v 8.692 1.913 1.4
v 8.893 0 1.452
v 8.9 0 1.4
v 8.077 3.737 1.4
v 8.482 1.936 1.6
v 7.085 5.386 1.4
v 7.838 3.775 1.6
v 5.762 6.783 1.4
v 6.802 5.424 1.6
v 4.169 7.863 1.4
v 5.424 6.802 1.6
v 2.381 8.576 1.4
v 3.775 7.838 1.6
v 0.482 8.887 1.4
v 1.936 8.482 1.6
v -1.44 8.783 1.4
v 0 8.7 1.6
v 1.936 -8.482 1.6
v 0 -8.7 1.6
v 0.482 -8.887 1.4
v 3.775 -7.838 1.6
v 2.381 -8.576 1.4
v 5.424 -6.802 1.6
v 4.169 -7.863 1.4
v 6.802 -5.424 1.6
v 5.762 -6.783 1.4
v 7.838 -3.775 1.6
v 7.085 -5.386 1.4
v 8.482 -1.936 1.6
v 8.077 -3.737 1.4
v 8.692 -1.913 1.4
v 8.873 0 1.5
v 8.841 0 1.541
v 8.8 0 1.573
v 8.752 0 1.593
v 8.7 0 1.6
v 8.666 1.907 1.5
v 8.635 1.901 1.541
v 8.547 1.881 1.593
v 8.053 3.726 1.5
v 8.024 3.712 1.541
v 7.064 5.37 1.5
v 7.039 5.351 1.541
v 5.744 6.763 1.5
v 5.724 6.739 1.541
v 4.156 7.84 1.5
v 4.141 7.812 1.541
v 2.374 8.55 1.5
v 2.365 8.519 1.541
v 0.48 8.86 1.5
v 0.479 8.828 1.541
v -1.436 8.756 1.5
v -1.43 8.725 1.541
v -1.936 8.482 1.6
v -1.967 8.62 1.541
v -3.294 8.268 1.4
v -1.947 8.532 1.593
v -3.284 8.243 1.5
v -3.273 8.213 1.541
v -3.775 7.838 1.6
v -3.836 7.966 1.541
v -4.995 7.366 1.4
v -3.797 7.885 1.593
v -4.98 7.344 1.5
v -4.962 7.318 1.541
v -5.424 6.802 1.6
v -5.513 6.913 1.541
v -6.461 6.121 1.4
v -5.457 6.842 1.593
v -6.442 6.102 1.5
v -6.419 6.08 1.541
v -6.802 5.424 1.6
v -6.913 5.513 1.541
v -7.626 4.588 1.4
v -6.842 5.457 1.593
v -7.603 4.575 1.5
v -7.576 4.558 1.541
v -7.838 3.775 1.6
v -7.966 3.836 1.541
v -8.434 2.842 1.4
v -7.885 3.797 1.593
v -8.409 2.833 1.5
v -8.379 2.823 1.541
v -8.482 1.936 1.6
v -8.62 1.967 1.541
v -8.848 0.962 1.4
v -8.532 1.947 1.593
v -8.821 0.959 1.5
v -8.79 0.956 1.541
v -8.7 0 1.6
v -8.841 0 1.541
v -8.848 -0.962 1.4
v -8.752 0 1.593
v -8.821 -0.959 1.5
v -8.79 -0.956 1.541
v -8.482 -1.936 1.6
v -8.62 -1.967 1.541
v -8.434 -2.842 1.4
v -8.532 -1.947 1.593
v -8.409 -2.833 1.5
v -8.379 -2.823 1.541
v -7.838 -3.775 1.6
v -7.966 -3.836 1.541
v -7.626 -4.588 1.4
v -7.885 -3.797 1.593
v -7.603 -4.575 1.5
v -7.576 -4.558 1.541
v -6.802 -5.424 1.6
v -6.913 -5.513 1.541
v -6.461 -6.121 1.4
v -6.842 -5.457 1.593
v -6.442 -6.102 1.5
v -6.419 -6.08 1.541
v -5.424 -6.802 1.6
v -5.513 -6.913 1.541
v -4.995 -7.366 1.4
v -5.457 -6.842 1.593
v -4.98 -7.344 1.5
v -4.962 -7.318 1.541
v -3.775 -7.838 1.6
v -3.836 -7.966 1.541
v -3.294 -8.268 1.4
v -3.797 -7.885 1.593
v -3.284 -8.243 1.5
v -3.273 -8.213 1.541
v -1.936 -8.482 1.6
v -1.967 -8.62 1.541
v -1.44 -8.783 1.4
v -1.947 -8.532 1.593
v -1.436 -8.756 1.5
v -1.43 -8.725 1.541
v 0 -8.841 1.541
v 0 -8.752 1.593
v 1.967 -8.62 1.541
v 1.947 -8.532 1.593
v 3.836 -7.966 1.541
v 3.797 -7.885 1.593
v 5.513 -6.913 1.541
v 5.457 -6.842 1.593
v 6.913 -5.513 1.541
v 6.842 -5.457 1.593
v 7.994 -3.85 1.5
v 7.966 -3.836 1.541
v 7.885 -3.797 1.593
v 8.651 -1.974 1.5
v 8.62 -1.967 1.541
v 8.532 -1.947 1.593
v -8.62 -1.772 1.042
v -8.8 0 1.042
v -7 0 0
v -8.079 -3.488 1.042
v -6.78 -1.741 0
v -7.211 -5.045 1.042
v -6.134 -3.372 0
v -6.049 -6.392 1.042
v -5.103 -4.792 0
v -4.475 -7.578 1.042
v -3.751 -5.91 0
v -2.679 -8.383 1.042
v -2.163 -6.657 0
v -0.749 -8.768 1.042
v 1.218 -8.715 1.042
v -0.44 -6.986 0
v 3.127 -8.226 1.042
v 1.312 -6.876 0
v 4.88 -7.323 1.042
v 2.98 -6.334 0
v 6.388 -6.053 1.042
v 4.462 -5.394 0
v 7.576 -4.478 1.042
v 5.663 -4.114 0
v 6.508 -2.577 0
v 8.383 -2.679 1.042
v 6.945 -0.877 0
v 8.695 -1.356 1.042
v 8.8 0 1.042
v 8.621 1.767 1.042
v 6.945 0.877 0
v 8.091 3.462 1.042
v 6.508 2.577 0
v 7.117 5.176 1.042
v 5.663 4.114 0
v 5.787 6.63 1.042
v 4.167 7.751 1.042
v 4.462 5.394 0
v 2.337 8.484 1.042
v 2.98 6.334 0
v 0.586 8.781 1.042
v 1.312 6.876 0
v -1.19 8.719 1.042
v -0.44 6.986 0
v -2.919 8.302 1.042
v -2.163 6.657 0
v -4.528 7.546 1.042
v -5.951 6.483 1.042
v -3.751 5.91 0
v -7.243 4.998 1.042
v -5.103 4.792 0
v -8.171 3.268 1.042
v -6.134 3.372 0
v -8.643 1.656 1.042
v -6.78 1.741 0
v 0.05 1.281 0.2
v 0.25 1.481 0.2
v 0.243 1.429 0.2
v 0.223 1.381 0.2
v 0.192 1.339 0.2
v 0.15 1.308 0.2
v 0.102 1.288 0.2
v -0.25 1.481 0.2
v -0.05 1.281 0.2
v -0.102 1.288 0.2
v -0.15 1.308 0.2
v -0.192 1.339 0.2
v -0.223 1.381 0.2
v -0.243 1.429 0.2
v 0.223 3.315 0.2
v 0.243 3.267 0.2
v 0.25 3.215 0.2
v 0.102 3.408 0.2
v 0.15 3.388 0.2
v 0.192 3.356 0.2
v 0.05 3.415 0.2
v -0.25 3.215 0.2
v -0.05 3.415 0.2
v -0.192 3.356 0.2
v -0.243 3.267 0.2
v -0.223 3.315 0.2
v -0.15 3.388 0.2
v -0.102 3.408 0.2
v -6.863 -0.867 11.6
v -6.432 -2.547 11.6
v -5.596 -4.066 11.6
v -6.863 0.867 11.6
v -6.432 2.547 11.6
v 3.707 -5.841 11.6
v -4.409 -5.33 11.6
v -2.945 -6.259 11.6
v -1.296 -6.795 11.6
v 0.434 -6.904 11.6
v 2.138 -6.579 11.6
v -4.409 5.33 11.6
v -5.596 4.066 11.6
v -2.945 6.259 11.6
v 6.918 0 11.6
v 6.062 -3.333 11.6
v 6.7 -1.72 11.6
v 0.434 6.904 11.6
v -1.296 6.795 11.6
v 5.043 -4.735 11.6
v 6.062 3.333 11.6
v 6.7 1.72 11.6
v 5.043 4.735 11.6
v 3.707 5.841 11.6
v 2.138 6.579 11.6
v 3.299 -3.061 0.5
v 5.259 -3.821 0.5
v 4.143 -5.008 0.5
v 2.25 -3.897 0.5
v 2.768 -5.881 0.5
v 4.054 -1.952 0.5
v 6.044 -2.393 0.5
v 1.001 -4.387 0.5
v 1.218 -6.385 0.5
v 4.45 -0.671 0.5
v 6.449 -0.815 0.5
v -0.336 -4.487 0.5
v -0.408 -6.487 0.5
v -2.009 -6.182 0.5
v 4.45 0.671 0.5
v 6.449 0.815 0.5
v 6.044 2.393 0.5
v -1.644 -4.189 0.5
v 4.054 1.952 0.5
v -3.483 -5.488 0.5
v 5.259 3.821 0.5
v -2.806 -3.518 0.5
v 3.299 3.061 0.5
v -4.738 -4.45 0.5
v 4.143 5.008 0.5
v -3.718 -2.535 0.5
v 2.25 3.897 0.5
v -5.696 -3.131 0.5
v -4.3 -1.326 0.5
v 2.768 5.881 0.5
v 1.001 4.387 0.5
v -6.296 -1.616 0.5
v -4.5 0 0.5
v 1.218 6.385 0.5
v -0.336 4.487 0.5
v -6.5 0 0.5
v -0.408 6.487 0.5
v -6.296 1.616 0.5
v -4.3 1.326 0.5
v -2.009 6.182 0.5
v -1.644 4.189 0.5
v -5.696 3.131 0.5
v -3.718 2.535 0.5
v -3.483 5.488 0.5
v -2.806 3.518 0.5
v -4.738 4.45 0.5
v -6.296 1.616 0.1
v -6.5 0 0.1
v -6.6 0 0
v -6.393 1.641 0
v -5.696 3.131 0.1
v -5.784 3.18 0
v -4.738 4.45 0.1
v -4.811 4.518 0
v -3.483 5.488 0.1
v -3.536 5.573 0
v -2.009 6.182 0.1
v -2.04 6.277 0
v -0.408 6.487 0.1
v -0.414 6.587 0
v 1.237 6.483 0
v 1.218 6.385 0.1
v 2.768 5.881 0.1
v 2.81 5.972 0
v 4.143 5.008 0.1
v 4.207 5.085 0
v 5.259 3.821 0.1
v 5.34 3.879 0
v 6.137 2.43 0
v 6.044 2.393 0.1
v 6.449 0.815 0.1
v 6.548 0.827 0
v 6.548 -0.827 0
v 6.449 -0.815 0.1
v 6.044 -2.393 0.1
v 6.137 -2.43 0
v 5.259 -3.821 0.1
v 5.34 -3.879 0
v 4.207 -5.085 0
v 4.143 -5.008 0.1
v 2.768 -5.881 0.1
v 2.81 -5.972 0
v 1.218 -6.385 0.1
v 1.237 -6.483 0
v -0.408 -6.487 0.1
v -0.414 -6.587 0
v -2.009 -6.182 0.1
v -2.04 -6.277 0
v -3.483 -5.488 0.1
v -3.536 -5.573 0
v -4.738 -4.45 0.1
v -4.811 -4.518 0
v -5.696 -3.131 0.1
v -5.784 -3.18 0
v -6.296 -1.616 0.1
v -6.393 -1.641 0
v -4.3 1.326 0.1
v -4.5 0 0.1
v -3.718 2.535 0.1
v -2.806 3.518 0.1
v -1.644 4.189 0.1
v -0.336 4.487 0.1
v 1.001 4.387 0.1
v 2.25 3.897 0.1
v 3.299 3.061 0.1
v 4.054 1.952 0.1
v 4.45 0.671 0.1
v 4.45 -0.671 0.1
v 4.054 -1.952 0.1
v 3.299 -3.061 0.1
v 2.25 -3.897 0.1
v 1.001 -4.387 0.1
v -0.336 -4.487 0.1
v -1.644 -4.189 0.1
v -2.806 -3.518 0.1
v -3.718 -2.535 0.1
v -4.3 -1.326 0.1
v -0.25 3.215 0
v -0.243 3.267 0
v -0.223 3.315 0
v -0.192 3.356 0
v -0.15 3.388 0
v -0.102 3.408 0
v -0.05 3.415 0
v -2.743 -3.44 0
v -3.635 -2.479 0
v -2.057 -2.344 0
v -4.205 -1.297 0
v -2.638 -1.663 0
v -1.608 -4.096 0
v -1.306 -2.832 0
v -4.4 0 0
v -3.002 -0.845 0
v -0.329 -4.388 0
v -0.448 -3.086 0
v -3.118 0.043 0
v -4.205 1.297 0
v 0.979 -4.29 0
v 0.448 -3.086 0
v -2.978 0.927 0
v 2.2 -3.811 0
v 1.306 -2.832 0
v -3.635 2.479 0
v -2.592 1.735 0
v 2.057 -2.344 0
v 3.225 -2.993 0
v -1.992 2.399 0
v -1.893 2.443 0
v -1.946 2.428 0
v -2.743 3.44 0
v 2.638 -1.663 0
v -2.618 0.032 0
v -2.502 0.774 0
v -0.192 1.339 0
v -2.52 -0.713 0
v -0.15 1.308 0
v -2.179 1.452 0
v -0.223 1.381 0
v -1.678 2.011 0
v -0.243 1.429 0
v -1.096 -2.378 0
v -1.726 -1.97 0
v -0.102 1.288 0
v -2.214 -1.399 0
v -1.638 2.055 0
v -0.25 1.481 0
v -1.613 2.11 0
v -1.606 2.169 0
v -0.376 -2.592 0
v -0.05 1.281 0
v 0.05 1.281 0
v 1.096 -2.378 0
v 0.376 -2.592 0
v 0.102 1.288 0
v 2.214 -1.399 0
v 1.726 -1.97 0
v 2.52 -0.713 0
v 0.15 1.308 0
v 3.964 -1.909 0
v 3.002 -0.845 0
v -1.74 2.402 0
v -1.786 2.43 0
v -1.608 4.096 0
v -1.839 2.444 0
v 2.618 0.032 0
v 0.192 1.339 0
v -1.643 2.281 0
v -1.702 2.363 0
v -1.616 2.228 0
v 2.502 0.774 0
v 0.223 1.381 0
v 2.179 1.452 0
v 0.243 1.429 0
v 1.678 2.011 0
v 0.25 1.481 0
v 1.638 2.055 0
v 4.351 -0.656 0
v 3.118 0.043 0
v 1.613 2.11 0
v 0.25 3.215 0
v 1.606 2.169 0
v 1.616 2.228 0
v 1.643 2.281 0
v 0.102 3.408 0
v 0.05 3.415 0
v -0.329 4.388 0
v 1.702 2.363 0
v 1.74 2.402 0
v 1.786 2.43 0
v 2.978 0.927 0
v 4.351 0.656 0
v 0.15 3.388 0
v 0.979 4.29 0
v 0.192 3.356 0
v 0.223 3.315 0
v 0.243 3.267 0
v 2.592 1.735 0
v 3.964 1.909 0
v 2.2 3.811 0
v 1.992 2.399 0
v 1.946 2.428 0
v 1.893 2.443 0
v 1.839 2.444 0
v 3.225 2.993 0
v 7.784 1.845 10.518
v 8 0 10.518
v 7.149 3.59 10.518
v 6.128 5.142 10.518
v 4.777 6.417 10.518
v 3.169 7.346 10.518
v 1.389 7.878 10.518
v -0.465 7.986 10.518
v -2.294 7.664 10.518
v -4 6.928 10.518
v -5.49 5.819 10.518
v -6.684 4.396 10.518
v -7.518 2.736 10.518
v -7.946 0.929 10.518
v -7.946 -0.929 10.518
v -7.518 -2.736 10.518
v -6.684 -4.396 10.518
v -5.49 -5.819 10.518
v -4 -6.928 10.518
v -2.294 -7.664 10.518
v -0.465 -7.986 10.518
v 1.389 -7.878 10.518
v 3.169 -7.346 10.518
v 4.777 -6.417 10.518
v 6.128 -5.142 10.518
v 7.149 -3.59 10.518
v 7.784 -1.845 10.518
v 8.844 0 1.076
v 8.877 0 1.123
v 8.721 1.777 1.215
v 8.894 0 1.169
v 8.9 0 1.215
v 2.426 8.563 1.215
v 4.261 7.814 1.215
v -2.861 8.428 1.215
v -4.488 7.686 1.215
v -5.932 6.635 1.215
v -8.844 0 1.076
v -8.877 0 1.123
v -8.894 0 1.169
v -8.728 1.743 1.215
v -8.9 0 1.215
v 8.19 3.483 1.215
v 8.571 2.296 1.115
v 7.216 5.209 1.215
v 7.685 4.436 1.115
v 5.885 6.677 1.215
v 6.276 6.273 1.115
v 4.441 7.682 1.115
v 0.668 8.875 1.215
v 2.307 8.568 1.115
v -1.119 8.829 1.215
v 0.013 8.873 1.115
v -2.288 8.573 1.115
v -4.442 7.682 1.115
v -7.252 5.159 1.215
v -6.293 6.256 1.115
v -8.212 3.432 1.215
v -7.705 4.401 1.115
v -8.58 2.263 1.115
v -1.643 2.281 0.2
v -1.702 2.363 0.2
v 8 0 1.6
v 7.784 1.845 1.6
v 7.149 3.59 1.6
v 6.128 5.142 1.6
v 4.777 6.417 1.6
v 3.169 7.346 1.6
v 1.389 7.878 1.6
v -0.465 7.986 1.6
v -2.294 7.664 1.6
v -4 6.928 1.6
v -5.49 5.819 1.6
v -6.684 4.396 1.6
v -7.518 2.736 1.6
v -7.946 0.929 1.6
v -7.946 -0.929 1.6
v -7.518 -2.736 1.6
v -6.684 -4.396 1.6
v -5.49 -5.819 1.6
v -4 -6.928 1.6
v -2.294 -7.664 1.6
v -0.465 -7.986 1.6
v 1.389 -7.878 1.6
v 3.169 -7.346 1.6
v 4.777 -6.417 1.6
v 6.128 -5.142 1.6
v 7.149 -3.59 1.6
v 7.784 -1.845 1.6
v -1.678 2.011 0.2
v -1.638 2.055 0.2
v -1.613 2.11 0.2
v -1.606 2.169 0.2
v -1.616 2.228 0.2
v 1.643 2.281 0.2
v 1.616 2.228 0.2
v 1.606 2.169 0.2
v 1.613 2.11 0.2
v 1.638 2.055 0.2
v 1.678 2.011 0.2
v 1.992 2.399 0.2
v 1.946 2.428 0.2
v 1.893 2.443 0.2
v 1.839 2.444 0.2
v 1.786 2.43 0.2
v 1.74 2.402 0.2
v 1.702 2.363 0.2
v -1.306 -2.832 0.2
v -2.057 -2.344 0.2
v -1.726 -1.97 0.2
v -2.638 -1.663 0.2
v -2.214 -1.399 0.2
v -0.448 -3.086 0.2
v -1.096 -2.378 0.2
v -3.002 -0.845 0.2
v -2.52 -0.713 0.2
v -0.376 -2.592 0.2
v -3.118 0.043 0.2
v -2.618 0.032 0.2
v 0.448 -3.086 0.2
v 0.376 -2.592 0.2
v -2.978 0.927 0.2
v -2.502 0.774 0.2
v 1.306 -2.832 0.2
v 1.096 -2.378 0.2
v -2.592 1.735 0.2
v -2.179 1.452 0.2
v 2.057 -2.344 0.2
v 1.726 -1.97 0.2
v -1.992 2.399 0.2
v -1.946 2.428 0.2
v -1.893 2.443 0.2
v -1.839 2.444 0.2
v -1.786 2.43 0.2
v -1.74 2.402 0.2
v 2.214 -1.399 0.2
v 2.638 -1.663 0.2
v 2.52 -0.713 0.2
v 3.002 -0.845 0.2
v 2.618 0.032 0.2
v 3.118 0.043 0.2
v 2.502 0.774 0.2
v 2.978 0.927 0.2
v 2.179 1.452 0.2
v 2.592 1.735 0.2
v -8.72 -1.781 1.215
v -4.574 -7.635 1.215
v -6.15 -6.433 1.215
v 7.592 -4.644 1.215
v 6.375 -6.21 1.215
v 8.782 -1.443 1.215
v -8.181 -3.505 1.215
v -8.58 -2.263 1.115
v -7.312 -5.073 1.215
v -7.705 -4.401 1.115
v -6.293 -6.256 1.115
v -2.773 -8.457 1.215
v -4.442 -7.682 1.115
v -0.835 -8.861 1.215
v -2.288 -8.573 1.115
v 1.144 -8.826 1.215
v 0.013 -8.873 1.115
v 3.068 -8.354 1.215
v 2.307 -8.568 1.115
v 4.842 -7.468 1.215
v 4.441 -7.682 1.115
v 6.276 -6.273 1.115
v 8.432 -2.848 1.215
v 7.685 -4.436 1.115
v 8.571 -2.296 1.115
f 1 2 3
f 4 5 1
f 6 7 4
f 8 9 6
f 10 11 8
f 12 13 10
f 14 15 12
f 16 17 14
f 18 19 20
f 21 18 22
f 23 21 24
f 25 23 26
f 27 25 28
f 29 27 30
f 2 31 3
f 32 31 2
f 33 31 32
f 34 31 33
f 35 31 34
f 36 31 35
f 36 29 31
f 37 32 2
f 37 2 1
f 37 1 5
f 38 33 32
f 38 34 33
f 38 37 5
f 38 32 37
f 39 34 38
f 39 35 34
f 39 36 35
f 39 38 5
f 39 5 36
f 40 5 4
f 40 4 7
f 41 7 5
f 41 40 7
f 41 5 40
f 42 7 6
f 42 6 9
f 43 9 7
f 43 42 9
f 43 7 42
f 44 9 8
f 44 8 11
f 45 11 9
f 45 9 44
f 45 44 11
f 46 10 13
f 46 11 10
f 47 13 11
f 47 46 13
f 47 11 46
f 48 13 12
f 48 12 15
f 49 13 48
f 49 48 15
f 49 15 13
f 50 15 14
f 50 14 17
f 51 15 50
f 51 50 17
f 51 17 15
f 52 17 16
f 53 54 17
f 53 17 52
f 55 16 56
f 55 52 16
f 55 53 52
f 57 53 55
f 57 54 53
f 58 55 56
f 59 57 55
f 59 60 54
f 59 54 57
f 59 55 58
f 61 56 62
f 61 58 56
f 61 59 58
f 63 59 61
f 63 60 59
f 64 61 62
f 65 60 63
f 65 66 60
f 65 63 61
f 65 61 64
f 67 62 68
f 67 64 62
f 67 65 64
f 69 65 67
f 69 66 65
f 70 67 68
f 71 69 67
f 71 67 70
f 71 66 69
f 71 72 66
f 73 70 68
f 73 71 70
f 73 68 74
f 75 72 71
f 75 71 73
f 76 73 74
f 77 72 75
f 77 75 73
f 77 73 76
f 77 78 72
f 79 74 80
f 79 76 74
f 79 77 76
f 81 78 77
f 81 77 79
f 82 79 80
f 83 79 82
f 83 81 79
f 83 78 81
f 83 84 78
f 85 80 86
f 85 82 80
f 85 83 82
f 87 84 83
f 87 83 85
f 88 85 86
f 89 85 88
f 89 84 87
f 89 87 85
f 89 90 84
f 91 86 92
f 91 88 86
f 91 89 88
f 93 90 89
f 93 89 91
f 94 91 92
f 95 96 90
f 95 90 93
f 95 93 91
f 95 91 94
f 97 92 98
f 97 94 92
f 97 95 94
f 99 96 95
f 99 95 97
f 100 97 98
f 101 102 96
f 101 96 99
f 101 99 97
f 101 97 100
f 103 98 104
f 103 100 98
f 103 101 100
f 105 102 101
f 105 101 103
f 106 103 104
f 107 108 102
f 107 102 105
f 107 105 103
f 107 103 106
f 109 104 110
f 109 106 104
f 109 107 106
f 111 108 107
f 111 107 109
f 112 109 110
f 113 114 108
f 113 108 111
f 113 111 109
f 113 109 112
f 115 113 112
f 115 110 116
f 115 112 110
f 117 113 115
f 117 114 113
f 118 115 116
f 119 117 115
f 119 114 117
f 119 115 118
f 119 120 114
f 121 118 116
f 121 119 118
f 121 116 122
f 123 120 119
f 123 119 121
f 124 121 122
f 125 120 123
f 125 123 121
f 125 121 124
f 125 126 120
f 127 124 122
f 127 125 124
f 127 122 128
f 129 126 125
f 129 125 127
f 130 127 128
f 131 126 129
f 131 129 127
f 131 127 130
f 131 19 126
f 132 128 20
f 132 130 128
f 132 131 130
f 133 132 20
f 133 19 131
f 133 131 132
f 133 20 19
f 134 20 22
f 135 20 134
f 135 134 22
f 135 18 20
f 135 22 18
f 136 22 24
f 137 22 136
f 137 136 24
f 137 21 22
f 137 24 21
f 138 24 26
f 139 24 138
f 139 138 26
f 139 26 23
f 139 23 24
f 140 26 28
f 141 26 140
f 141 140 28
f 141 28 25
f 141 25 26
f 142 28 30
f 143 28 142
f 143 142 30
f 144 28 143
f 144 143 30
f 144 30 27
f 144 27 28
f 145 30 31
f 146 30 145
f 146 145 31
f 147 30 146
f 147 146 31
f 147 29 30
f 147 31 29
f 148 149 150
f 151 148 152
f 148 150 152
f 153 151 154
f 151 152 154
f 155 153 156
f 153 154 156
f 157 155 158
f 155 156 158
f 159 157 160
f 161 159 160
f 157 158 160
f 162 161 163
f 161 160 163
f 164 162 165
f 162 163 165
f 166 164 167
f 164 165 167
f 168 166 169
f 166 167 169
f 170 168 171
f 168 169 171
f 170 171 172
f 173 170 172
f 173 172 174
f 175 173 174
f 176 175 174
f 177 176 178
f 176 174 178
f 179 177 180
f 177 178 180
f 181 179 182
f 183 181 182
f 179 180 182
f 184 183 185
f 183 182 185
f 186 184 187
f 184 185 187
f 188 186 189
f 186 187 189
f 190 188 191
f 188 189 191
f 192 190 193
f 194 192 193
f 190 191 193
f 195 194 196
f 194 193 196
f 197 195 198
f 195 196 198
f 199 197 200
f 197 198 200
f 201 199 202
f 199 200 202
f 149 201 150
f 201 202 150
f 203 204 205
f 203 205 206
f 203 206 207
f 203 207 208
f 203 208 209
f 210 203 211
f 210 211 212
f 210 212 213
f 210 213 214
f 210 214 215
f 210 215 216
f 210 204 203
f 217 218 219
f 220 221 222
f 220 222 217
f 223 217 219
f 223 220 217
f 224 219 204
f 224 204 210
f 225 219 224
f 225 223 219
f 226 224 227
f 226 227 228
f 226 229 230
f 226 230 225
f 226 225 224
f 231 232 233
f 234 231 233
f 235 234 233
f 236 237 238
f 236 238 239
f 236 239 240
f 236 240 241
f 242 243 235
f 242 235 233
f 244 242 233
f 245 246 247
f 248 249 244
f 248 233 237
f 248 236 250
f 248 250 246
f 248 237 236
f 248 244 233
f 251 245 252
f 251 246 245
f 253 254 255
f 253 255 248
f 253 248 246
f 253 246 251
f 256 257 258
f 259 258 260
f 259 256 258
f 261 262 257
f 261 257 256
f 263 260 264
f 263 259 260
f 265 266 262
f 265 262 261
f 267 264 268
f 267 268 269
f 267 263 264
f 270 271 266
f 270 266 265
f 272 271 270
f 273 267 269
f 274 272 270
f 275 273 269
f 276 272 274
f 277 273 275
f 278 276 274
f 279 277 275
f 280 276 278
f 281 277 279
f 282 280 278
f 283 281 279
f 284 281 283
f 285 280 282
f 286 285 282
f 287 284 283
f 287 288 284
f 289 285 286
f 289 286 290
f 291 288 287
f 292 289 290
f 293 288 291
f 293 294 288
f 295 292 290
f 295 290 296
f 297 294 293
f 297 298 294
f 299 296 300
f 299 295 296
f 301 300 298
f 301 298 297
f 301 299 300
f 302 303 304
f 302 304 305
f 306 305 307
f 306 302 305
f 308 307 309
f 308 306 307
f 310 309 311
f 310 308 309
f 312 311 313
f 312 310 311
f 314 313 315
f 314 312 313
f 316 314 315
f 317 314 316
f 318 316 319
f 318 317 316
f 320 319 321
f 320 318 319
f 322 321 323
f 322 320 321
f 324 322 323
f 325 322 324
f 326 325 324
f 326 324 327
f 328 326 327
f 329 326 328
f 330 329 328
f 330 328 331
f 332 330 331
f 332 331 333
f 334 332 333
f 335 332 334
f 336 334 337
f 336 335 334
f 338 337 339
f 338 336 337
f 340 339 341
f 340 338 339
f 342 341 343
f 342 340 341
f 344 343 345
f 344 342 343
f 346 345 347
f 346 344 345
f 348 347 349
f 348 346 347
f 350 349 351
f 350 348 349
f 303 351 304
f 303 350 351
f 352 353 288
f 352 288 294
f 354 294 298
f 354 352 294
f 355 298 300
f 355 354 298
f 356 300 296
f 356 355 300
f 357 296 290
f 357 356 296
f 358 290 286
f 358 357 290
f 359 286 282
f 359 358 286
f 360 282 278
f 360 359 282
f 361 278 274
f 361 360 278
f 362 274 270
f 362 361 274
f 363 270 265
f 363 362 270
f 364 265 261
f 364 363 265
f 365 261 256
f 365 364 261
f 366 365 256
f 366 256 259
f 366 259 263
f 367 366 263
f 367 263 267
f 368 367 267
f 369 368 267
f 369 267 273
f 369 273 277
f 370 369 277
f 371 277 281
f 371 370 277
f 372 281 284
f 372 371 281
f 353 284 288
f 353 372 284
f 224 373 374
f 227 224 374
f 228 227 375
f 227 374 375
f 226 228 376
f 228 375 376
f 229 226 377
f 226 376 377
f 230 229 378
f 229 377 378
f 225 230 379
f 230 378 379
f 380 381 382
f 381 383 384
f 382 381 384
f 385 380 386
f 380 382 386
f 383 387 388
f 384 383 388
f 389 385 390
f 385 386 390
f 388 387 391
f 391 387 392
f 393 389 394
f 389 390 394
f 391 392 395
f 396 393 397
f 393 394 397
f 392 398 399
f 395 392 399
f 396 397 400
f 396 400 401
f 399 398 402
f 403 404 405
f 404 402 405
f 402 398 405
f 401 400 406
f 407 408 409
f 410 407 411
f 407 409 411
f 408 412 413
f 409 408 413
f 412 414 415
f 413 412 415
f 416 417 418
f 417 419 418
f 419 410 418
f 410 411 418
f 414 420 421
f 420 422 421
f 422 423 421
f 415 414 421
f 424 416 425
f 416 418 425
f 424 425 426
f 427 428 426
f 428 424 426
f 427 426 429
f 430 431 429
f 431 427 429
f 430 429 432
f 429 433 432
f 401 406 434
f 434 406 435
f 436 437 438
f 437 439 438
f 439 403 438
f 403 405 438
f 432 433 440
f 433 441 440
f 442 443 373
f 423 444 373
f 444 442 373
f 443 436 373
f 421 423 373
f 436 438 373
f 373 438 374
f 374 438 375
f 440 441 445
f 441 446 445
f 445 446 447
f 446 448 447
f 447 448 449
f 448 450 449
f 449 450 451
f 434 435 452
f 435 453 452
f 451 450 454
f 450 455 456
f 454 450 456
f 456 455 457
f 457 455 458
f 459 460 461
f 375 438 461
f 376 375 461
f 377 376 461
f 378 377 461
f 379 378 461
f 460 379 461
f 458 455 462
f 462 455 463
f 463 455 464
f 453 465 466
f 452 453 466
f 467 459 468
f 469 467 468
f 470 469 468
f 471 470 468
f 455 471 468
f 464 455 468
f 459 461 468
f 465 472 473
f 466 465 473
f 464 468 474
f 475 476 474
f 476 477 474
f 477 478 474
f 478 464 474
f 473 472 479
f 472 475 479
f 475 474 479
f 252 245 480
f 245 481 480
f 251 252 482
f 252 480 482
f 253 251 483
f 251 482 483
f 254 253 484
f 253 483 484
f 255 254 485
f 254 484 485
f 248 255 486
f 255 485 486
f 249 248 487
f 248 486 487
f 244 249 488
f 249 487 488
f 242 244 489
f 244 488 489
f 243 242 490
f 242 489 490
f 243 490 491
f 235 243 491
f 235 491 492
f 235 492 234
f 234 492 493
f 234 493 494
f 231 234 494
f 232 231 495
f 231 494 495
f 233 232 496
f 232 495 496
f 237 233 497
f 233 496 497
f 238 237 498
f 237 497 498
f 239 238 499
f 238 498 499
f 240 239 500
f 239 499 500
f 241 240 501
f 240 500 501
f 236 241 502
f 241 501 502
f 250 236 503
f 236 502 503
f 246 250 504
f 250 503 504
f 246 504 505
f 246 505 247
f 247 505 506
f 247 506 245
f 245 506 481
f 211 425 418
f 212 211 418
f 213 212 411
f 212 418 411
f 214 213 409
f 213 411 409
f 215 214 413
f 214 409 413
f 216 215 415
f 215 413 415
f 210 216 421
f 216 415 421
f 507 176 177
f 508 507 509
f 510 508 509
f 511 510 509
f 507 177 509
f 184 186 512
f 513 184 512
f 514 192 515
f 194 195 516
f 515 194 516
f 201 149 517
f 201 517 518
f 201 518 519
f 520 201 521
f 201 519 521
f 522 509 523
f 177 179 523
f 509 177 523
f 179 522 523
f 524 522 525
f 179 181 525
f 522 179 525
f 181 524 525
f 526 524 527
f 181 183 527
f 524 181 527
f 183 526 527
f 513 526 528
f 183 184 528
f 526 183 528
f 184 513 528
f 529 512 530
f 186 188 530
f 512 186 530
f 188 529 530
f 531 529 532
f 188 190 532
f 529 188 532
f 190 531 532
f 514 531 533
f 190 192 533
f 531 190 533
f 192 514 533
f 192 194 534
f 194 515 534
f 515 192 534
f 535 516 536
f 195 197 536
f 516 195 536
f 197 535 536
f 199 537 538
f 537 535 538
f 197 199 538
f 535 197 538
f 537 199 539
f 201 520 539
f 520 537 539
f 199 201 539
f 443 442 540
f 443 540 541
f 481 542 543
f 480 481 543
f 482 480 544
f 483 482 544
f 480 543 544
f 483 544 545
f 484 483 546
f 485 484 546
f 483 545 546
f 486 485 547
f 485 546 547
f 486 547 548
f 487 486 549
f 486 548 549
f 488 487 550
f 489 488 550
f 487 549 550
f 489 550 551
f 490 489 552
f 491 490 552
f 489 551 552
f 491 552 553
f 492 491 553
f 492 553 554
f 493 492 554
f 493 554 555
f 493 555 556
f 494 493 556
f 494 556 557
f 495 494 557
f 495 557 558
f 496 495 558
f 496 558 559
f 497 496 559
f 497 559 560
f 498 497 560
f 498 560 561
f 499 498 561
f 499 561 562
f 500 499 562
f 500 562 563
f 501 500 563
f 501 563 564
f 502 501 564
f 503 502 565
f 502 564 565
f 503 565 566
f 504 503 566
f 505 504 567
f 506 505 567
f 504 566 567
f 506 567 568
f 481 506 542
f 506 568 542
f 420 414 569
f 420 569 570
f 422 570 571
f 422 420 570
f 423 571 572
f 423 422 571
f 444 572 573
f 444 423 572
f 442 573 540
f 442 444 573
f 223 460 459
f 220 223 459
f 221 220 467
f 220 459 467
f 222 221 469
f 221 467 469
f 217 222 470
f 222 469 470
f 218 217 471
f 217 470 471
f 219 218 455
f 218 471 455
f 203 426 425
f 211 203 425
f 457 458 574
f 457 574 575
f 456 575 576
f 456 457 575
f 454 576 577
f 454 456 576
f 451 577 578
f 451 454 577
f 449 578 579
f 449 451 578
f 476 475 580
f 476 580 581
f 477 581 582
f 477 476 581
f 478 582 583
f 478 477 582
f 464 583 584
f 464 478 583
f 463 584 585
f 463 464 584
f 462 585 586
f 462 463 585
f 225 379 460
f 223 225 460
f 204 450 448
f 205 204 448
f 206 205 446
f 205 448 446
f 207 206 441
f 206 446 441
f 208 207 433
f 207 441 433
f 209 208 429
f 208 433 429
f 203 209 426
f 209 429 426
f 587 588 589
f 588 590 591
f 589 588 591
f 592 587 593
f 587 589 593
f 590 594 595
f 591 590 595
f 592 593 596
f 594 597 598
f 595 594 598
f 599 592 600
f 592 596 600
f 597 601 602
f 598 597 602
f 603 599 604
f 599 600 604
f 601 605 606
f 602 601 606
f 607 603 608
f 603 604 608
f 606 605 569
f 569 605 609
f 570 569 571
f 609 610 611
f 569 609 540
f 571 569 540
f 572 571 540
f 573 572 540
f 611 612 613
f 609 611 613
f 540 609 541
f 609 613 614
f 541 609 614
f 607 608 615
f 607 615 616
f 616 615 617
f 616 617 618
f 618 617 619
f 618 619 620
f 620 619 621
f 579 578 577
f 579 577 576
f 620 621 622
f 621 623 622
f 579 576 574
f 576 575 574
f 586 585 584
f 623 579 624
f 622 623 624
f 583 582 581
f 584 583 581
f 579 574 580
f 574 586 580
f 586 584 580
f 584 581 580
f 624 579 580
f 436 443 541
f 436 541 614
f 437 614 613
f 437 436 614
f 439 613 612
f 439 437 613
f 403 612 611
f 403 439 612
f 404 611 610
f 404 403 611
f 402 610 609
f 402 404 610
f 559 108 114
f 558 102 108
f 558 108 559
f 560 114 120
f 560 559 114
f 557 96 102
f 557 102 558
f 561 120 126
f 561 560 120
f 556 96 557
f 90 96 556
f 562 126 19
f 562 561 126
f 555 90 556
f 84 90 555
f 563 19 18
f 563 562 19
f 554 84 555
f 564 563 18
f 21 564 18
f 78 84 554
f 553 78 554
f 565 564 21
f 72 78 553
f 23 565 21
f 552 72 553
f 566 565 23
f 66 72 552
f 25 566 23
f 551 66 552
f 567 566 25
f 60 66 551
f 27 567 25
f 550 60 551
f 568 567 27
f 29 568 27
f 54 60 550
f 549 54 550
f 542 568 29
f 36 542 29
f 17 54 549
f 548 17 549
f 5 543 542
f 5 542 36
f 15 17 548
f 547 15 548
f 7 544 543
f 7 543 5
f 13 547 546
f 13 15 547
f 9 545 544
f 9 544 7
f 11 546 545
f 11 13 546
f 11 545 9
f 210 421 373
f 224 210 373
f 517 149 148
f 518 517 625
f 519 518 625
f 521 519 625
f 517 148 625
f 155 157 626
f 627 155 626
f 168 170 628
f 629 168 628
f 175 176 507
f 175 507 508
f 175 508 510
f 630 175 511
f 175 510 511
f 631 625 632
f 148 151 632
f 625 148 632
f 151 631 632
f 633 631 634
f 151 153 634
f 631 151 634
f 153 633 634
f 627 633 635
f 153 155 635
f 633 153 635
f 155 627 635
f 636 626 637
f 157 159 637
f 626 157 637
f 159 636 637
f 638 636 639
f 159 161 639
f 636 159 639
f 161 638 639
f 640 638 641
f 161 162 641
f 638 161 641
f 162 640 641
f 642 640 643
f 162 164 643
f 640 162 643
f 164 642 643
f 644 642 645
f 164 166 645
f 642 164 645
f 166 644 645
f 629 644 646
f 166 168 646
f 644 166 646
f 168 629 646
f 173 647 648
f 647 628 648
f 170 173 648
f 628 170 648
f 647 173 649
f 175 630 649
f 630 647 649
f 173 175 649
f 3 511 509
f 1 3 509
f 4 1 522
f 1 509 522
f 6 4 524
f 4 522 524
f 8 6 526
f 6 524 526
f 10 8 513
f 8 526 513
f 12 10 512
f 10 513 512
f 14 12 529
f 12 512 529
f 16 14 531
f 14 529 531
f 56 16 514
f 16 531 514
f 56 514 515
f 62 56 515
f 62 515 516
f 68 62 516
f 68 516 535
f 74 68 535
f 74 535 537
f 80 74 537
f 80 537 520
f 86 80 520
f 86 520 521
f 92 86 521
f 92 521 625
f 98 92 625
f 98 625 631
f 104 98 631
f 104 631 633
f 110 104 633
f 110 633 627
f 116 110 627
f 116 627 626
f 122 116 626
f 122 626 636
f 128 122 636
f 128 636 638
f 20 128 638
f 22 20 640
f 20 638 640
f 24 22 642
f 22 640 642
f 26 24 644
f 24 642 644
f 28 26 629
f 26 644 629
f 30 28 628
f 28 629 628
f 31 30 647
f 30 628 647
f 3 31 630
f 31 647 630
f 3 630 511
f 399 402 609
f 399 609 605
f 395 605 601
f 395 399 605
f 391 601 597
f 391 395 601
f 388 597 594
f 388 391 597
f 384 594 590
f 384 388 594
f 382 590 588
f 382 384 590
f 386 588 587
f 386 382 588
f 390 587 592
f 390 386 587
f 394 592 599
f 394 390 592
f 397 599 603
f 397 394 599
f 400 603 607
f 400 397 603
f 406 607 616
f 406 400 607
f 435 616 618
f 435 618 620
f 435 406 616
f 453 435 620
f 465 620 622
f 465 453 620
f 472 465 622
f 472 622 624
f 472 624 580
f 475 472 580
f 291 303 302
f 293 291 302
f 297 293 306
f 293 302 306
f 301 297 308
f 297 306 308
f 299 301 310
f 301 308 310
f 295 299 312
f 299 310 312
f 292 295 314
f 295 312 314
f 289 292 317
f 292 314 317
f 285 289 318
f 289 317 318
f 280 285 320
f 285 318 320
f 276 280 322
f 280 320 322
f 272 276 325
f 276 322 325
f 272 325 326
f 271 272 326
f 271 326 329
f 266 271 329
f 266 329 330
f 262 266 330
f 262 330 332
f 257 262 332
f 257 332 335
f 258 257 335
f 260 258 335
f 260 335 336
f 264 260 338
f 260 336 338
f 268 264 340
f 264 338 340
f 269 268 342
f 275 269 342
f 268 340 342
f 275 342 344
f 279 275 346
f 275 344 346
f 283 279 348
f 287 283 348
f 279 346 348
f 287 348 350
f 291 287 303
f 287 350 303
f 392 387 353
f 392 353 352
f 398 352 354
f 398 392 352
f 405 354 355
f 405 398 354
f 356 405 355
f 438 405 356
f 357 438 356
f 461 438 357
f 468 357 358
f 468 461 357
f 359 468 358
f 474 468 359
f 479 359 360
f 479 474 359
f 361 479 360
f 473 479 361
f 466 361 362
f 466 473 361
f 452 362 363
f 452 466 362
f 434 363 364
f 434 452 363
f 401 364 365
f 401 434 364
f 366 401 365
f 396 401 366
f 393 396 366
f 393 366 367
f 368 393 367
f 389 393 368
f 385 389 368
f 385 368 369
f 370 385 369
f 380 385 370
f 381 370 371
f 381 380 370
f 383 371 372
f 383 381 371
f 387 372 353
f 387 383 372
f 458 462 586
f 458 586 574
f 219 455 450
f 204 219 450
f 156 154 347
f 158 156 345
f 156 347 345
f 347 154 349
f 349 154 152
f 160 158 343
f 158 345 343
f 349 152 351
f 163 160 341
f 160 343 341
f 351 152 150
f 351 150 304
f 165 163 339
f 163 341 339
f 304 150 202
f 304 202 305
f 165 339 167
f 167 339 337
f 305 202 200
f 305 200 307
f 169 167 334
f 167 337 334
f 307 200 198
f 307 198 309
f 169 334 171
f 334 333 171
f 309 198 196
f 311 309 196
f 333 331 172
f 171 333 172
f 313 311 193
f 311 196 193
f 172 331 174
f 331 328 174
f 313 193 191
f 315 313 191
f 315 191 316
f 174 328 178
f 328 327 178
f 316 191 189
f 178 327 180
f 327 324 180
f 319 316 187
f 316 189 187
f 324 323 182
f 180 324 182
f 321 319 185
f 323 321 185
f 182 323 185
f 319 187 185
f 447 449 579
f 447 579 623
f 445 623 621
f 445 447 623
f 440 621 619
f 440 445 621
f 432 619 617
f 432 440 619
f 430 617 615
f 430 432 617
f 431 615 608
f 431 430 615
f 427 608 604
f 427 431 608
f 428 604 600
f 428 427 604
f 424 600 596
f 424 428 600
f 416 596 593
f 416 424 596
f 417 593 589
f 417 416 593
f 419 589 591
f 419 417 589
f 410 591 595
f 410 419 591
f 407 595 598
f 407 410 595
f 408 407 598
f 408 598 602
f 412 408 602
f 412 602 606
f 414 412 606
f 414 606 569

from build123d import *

# Parameters (mm, degrees)
SKETCH_2_R          = 8.9
EXTRUDE_1_DEPTH     = 1.6
SKETCH_4_R          = 8
EXTRUDE_2_DEPTH     = 10
SKETCH_7_R          = 6.5
SKETCH_7_R_2        = 4.5
CUT_EXTRUDE_1_DEPTH = 0.5
CUT_EXTRUDE_2_DEPTH = 0.2
CHAMFER_1_SIZE      = 0.1
FILLET_1_R          = 0.2


# Read off the part's stored shape, not the designer's step: M16 机械螺纹 螺柱1
with BuildPart() as part:
    # 草图2 → 凸台-拉伸1 (new body)
    with BuildSketch(Plane.XY):
        Circle(SKETCH_2_R)
    extrude(amount=EXTRUDE_1_DEPTH)

    # 草图3 → 切除-旋转1 (revolve, cut)
    with BuildSketch(Plane(origin=(0, 0, 0), x_dir=(1, 0, 0), z_dir=(0, 1, 0))):
        Polygon((-8.9, -1.1), (-7, 0), (-8.9, 0), align=None)
    revolve(axis=Axis((0, 0, -2.565533084), (0, 0, 1)), mode=Mode.SUBTRACT)

    # 草图4 → 凸台-拉伸2 (add)
    with BuildSketch(Plane.XY.offset(1.6)):
        Circle(SKETCH_4_R)
    extrude(amount=EXTRUDE_2_DEPTH)

    # M16 机械螺纹 螺柱1 outline → M16 机械螺纹 螺柱1 (revolve, cut)
    with BuildSketch(Plane.XZ):
        Polygon((8, 11.6), (6.9175, 11.6), (8, 10.5175), align=None)
    revolve(axis=Axis((0, 0, 0), (0, 0, 1)), mode=Mode.SUBTRACT)

    # 草图7 → 切除-拉伸1 (cut)
    with BuildSketch(Plane(origin=(0, 0, 0), x_dir=(-1, 0, 0), z_dir=(0, 0, -1))):
        Circle(SKETCH_7_R)
        Circle(SKETCH_7_R_2, mode=Mode.SUBTRACT)
    extrude(amount=-CUT_EXTRUDE_1_DEPTH, mode=Mode.SUBTRACT)

    # 草图8 → 切除-拉伸2 (cut)
    with BuildSketch(Plane(origin=(0, 0, 0), x_dir=(-1, 0, 0), z_dir=(0, 0, -1))):
        with BuildLine():
            Line((1.643434087, 2.281182047), (1.702030214, 2.362516878))
            ThreePointArc((1.702030214, 2.362516878), (1.839011457, 2.444004167), (1.992055967, 2.399491052))
            ThreePointArc((1.992055967, 2.399491052), (0, -3.11862859), (-1.992055967, 2.399491052))
            ThreePointArc((-1.992055967, 2.399491052), (-1.839011457, 2.444004167), (-1.702030214, 2.362516878))
            Line((-1.702030214, 2.362516878), (-1.643434087, 2.281182047))
            ThreePointArc((-1.643434087, 2.281182047), (-1.607282835, 2.139224365), (-1.677581098, 2.010705686))
            ThreePointArc((-1.677581098, 2.010705686), (0, -2.61862859), (1.677581098, 2.010705686))
            ThreePointArc((1.677581098, 2.010705686), (1.607282835, 2.139224365), (1.643434087, 2.281182047))
        make_face()
        with BuildLine():
            Line((-0.050122003, 1.280793561), (0.050122003, 1.280793561))
            ThreePointArc((0.050122003, 1.280793561), (0.191543359, 1.339372204), (0.250122003, 1.480793561))
            Line((0.250122003, 1.480793561), (0.250122003, 3.214947097))
            ThreePointArc((0.250122003, 3.214947097), (0.191543359, 3.356368453), (0.050122003, 3.414947097))
            Line((0.050122003, 3.414947097), (-0.050122003, 3.414947097))
            ThreePointArc((-0.050122003, 3.414947097), (-0.191543359, 3.356368453), (-0.250122003, 3.214947097))
            Line((-0.250122003, 3.214947097), (-0.250122003, 1.480793561))
            ThreePointArc((-0.250122003, 1.480793561), (-0.191543359, 1.339372204), (-0.050122003, 1.280793561))
        make_face()
    extrude(amount=-CUT_EXTRUDE_2_DEPTH, mode=Mode.SUBTRACT)

    # 倒角1
    chamfer_1_edges = [part.edges().sort_by_distance(p)[0] for p in [
        (6.5, 0, 0),
        (4.5, 0, 0),
    ]]
    chamfer(chamfer_1_edges, length=CHAMFER_1_SIZE)

    # 圆角1
    fillet_1_edges = [part.edges().sort_by_distance(p)[0] for p in [
        (-8.9, 0, 1.6),
        (0, 8.9, 1.1),
    ]]
    fillet(fillet_1_edges, radius=FILLET_1_R)


solid = part.part
